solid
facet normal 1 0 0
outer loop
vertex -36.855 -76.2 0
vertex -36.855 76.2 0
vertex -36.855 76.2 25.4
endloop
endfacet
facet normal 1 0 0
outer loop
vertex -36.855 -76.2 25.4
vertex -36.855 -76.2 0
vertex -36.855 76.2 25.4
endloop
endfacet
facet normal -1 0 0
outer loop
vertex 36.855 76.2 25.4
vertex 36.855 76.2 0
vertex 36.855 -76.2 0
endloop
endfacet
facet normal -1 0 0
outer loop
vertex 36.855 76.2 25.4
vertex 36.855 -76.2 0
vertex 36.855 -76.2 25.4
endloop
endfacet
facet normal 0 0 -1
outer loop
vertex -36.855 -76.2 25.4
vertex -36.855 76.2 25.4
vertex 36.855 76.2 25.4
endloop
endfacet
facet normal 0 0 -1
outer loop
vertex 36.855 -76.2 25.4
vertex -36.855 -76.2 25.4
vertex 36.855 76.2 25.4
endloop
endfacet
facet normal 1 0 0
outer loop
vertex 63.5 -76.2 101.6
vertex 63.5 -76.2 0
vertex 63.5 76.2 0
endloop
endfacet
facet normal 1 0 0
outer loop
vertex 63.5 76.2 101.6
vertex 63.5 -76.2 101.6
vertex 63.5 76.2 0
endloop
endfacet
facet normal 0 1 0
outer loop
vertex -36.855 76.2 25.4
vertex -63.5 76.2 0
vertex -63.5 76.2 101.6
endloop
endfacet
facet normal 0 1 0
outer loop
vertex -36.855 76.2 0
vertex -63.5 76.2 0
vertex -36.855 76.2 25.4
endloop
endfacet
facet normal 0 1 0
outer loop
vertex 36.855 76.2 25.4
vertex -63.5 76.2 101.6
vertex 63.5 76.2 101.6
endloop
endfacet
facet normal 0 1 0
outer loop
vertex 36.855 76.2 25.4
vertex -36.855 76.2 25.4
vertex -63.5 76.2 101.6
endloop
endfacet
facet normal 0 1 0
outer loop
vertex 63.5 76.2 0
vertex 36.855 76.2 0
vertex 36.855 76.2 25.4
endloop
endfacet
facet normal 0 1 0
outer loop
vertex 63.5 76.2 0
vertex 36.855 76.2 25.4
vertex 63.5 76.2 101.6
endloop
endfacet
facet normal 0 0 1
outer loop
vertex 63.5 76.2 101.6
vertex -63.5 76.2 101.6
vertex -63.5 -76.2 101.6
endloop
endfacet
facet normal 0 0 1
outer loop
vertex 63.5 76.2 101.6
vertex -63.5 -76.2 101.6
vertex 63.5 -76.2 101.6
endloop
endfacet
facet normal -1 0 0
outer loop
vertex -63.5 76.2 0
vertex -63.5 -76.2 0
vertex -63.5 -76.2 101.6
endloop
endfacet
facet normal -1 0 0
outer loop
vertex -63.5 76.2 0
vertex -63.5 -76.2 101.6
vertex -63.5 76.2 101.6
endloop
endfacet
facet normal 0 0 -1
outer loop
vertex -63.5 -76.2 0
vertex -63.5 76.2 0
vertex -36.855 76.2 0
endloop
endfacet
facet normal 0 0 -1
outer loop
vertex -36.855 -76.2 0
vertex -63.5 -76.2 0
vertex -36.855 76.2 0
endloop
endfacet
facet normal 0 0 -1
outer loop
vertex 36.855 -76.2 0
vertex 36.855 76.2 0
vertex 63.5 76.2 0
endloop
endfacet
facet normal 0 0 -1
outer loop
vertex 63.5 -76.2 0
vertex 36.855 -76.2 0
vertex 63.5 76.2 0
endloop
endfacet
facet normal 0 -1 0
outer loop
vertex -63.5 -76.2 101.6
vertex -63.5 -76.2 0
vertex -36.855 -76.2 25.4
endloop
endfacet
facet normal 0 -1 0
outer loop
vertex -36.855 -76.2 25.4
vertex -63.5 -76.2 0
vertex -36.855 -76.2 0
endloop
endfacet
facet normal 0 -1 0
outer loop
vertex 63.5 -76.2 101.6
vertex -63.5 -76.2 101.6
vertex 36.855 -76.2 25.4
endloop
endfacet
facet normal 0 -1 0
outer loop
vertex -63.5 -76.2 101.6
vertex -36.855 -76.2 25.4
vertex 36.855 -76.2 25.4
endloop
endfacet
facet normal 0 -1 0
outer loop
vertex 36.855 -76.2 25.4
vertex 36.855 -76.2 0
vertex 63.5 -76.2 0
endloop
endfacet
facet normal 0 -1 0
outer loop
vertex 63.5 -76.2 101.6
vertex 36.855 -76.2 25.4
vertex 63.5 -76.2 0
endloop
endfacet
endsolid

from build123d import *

# Parameters (mm, degrees)
F0_W     = 127
F0_H     = 152.4
F1_DEPTH = 101.6
F2_W     = 73.71036
F2_H     = 50.8
F3_DEPTH = 2540


with BuildPart() as f1:
    # F0 (on Top) → F1 (new body)
    with BuildSketch(Plane.XY):
        Rectangle(F0_W, F0_H)
    extrude(amount=F1_DEPTH)

    # F2 (on Front) → F3 (cut, symmetric)
    with BuildSketch(Plane.XZ):
        Rectangle(F2_W, F2_H)
    extrude(amount=F3_DEPTH, both=True, mode=Mode.SUBTRACT)


solid = f1.part
